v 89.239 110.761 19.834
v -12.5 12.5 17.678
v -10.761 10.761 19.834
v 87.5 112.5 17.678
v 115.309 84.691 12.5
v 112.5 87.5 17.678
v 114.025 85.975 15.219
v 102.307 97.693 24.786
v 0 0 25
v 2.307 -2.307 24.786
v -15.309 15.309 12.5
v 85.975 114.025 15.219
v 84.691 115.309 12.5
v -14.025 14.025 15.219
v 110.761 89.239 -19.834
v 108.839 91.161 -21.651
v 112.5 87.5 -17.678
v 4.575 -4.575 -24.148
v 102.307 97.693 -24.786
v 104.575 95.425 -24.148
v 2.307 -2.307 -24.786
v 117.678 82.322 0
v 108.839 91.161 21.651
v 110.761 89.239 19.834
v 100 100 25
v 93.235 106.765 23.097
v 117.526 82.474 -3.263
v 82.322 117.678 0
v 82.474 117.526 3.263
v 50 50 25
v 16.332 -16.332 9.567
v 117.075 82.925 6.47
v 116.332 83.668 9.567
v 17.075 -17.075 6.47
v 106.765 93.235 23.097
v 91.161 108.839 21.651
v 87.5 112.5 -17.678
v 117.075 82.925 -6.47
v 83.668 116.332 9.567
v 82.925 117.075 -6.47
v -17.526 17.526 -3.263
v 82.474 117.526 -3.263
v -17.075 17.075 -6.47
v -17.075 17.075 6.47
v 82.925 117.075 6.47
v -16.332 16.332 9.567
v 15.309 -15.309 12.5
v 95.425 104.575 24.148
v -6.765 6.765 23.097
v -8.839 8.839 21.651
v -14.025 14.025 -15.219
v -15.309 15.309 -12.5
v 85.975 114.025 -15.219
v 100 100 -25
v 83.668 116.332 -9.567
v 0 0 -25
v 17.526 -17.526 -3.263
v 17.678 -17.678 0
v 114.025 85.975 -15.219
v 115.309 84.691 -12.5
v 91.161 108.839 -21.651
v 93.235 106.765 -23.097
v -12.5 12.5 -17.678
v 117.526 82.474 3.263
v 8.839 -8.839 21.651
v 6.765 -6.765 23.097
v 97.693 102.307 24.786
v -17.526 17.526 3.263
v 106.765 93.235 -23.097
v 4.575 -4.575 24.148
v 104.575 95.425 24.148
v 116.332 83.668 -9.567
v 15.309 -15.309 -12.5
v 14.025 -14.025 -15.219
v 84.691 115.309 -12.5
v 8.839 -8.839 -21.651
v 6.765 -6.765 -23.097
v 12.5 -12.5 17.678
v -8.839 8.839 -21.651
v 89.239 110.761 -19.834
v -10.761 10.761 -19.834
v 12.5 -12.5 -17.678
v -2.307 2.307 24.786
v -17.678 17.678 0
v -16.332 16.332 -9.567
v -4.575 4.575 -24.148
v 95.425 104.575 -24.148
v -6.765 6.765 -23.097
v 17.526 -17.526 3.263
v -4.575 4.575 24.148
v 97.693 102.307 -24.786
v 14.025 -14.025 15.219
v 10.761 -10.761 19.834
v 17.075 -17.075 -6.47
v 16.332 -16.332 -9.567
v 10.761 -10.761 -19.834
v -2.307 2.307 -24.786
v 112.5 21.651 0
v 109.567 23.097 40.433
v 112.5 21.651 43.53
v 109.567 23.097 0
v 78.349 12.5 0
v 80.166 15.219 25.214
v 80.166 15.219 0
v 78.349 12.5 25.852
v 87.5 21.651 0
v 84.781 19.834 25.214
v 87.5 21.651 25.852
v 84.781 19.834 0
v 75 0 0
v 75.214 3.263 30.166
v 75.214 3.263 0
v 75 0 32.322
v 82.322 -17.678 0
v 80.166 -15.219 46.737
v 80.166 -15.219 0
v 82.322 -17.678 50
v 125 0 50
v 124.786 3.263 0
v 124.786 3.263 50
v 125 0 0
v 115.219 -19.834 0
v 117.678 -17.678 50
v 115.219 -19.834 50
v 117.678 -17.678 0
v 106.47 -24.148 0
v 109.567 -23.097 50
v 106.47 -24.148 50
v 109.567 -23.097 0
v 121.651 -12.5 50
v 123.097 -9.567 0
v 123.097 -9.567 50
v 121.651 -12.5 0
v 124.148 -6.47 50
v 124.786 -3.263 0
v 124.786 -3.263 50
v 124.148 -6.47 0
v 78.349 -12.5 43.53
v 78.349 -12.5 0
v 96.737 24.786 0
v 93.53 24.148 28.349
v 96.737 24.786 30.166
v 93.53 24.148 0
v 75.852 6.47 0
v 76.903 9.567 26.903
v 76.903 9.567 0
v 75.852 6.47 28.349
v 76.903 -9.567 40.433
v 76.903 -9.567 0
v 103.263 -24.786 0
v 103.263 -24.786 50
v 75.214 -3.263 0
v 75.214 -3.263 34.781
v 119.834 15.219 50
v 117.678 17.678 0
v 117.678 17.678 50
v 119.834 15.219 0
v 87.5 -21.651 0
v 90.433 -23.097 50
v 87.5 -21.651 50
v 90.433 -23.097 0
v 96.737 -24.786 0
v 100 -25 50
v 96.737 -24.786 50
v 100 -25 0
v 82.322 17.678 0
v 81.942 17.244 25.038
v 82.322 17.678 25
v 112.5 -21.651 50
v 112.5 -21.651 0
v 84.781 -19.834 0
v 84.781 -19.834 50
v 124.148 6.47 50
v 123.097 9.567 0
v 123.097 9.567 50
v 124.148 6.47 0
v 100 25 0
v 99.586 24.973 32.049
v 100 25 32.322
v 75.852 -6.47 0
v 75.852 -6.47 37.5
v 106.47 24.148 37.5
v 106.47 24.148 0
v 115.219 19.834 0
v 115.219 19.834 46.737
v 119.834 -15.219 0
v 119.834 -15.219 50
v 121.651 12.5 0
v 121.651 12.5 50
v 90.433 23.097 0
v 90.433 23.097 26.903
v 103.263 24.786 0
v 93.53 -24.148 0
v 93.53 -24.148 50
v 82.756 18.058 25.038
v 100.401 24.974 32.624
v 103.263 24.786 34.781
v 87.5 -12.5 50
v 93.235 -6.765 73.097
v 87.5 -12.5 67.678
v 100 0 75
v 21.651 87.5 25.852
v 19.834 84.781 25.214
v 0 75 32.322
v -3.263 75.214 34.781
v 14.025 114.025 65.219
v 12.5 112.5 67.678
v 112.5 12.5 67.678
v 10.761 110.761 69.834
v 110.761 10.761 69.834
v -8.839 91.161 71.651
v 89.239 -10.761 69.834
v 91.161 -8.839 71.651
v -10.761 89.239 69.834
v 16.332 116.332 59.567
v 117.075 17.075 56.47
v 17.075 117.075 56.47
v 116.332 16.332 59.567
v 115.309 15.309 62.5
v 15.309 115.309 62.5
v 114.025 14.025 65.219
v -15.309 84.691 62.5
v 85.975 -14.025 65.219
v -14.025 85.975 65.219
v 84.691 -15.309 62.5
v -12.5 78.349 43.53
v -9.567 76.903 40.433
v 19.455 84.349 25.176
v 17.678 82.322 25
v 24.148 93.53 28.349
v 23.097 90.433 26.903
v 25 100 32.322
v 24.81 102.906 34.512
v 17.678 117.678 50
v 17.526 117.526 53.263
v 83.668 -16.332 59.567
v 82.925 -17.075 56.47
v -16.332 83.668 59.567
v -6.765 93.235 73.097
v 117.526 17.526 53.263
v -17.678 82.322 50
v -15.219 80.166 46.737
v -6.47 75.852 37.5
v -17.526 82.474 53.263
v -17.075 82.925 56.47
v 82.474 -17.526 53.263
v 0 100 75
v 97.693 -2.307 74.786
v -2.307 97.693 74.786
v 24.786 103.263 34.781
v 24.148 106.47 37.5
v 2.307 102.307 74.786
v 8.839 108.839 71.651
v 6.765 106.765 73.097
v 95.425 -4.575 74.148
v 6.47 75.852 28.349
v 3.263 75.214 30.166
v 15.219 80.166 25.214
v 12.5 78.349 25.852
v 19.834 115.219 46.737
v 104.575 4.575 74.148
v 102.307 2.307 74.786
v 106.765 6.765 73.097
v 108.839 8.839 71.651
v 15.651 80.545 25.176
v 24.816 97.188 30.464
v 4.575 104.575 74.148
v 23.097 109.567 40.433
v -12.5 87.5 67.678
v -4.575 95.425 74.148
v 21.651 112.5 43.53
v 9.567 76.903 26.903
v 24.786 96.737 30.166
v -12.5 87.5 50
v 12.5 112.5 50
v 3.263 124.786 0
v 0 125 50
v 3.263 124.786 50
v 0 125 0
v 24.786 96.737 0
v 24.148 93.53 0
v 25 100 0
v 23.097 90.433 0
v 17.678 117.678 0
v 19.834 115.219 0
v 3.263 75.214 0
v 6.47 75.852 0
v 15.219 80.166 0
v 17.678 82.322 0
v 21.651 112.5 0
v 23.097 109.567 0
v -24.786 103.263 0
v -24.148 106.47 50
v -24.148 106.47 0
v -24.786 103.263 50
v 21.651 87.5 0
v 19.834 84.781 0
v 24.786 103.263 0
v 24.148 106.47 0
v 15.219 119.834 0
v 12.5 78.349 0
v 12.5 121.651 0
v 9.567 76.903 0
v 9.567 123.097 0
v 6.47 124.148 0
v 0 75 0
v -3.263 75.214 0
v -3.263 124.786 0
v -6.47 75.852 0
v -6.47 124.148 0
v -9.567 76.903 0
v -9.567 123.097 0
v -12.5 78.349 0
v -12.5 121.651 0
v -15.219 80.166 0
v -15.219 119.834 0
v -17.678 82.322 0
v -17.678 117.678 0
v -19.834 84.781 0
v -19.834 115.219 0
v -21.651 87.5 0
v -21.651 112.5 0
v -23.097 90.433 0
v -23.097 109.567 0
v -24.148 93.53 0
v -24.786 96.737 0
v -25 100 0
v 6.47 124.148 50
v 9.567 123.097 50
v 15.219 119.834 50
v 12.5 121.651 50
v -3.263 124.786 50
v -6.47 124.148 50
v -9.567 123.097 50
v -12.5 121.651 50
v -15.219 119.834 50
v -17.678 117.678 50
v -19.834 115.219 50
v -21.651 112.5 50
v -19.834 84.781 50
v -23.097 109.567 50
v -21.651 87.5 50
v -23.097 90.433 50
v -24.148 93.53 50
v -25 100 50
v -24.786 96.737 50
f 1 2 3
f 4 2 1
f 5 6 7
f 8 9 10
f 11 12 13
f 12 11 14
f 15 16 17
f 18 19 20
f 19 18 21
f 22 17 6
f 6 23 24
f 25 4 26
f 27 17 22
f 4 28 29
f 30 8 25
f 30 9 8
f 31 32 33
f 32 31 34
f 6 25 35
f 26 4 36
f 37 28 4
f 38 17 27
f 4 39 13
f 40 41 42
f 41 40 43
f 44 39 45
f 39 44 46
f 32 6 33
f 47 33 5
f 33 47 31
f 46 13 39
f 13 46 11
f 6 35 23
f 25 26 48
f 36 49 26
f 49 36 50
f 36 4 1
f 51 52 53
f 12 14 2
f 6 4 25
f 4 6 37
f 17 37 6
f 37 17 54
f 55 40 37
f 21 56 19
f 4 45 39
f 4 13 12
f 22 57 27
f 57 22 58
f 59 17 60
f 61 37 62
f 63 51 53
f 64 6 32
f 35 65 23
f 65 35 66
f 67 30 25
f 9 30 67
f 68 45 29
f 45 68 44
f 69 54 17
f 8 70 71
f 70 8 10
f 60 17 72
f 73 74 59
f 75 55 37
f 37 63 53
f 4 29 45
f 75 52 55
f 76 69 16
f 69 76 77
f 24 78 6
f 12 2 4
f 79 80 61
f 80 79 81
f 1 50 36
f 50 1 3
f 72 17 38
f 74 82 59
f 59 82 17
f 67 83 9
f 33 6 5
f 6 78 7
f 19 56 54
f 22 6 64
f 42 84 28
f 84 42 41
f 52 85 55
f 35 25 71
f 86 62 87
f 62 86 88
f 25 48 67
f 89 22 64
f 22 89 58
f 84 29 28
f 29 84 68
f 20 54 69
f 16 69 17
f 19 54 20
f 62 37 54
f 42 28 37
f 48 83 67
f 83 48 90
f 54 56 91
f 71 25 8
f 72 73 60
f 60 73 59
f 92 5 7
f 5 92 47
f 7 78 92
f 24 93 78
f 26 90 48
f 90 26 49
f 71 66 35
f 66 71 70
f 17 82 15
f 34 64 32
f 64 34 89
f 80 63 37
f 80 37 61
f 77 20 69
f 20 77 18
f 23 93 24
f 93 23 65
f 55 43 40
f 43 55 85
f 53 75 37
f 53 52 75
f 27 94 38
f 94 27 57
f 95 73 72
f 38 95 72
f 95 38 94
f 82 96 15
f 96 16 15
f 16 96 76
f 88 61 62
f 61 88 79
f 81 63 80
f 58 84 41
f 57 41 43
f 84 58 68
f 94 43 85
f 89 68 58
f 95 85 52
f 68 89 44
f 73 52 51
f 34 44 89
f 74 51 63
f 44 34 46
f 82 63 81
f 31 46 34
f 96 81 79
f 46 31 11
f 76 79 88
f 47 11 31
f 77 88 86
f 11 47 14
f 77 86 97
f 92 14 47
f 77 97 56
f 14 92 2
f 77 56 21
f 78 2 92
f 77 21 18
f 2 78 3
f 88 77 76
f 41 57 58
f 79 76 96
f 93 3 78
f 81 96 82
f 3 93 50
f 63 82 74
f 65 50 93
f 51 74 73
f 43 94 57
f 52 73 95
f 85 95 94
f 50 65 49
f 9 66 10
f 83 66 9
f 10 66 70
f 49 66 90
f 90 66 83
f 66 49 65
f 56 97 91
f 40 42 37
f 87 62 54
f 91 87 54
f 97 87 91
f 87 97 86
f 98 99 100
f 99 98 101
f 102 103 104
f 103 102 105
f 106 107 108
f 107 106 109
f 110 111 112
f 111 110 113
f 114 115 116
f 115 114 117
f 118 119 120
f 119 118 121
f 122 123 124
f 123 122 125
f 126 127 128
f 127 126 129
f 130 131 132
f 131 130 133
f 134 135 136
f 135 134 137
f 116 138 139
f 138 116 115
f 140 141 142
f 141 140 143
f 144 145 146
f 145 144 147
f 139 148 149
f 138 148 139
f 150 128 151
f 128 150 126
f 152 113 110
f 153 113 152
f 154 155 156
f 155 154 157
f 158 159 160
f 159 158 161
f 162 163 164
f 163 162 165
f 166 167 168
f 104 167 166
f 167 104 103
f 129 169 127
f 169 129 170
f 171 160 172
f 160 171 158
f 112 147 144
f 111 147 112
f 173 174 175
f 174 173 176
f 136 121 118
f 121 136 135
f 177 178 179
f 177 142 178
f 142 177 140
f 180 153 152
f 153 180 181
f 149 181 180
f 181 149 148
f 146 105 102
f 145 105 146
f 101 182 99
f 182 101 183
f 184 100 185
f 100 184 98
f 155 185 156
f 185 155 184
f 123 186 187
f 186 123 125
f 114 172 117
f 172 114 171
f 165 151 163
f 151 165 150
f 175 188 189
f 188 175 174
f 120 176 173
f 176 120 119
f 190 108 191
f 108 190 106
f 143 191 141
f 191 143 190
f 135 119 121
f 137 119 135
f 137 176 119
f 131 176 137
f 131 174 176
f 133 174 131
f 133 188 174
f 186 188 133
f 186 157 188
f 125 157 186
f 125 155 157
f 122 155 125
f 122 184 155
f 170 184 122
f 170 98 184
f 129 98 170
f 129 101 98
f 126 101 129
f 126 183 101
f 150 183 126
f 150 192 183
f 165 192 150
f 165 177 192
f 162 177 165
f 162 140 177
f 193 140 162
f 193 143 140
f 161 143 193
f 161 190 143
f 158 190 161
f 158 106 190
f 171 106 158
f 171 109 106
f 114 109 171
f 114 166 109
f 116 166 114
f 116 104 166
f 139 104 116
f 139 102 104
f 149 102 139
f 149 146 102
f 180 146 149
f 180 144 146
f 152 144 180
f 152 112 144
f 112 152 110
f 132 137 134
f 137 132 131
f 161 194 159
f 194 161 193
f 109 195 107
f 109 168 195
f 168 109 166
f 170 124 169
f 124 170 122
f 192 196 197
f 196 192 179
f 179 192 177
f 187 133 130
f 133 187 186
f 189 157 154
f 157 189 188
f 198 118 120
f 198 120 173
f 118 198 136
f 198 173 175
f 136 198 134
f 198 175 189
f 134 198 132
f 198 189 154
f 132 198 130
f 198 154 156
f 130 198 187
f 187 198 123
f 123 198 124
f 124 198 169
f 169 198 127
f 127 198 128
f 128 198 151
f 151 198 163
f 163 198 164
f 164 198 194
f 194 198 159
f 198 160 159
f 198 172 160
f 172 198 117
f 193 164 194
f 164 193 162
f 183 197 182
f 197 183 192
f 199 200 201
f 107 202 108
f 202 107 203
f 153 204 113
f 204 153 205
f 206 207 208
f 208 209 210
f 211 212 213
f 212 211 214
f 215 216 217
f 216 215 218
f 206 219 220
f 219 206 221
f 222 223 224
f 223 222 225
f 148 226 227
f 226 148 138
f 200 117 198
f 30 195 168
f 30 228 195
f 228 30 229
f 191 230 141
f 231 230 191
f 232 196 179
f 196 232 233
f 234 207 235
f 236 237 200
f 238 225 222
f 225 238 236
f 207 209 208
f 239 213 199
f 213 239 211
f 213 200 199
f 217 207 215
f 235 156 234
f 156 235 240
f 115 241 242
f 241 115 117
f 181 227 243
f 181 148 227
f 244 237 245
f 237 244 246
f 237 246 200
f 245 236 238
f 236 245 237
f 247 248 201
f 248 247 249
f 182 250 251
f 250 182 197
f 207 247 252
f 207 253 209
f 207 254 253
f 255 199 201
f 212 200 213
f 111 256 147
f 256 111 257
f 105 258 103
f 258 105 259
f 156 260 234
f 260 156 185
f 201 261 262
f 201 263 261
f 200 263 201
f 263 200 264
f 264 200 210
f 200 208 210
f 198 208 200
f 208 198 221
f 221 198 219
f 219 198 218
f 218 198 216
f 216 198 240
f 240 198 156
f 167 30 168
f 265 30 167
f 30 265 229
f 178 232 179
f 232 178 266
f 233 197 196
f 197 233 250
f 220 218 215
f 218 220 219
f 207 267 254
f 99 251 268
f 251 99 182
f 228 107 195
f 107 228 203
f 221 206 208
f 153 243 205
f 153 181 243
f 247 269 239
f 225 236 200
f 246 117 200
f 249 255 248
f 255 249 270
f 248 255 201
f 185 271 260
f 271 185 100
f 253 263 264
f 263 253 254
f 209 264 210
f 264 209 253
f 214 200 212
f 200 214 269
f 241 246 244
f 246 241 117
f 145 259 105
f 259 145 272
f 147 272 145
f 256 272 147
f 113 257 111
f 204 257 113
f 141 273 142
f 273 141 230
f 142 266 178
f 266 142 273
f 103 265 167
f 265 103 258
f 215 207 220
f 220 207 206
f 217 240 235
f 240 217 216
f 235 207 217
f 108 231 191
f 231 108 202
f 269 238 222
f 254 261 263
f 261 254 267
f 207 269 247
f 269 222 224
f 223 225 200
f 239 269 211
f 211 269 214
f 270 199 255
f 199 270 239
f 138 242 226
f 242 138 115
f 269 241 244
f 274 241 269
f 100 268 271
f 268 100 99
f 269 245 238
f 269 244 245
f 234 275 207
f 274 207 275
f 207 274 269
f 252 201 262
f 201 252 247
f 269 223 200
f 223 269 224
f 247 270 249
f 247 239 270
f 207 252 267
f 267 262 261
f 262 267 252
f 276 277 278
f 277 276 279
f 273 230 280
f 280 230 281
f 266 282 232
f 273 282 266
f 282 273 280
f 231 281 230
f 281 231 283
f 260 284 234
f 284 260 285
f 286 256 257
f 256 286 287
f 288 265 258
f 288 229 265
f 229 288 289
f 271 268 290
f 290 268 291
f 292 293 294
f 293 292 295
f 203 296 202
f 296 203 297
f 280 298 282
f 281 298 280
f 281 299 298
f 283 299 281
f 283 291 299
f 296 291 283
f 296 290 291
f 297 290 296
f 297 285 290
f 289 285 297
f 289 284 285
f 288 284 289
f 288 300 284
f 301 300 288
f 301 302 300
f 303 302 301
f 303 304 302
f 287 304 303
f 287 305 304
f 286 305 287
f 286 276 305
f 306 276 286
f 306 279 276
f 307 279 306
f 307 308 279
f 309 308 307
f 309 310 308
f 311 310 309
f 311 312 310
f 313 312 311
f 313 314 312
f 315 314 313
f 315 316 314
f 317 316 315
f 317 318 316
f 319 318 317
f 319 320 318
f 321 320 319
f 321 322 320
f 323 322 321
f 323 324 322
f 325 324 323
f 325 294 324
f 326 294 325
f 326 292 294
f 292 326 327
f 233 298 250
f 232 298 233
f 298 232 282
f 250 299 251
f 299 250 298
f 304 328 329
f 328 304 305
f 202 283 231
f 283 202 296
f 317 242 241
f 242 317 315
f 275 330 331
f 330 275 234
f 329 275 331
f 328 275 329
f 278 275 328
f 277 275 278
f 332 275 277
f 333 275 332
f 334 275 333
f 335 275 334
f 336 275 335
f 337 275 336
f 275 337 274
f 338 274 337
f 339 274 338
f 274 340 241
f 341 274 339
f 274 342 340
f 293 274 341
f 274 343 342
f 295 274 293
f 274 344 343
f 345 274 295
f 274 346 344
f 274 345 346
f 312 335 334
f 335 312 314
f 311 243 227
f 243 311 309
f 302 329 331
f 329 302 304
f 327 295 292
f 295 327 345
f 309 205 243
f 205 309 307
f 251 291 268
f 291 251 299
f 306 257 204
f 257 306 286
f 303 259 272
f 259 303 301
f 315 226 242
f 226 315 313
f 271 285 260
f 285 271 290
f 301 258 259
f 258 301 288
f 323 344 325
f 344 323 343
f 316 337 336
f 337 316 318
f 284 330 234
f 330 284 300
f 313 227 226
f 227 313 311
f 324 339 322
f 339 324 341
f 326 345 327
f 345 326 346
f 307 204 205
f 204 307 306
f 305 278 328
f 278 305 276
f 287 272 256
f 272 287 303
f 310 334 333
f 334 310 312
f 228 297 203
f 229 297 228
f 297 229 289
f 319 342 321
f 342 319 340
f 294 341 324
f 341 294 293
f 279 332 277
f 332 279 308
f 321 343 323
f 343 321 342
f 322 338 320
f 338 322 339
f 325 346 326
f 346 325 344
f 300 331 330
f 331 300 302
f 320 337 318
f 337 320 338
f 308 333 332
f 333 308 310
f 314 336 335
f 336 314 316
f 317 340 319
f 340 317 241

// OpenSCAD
$fn = 48;

union() {
	translate(v = [0, 0, 0]) {
		rotate(a = 180, v = [100.0, 100.0, 141.4213562373095]) {
			cylinder(center = false, h = 141.4213562373095, r = 25.0000000000);
		}
	}
	translate(v = [100, 0, 0]) {
		rotate(a = 180, v = [0.0, 0.0, 100.0]) {
			cylinder(center = false, h = 50.0, r = 25.0000000000);
		}
	}
	translate(v = [100, 0, 50]) {
		rotate(a = 180, v = [-100.0, 100.0, 141.4213562373095]) {
			cylinder(center = false, h = 141.4213562373095, r = 25.0000000000);
		}
	}
	translate(v = [0, 100, 50]) {
		rotate(a = 180, v = [1, 0, 0]) {
			cylinder(center = false, h = 50.0, r = 25.0000000000);
		}
	}
}
/***********************************************
*********      SolidPython code:      **********
************************************************
 
"""Library with extensions for solidpython.

Author: Landon Carter (lcarter@mit.edu)
"""

import solid
import numpy as np


def cylinder_from_to(diameter, xyz1, xyz2):
    """Defines a cylinder of diameter from xyz1 to xyz2

    Args:
        diameter: The diameter of the cylinder (float)
        xyz1: The coordinates of the center of one face (list)
        xyz2: The coordinates of the center of the other face (list)

    Returns:
        A solid.cylinder which is the cylinder of diam d from xyz1 to xyz2.
    """
    length = np.linalg.norm(np.array(xyz2) - np.array(xyz1))
    axis_vec = np.array(xyz2) - np.array(xyz1)
    z_vec = np.array((0, 0, length))
    half_axis_vec = z_vec + axis_vec
    if np.linalg.norm(half_axis_vec) == 0:
        half_axis_vec = np.array([1, 0, 0])
    cyl = solid.translate(xyz1)(
        solid.rotate(180, list(half_axis_vec))(
            solid.cylinder(h=length, r=(diameter/2.), center=False)
        )
    )

    return cyl


a = cylinder_from_to(50, [0,0,0], [100,100,0])
b = cylinder_from_to(50, [100,0,0], [100,00,50])
c = cylinder_from_to(50, [100,0,50], [0,100,50])
d = cylinder_from_to(50, [0,100,50], [0,100,0])

everything = solid.union()([a, b, c, d])

solid.scad_render_to_file(everything, "out.scad", file_header='$fn = 48;') 
 
************************************************/
